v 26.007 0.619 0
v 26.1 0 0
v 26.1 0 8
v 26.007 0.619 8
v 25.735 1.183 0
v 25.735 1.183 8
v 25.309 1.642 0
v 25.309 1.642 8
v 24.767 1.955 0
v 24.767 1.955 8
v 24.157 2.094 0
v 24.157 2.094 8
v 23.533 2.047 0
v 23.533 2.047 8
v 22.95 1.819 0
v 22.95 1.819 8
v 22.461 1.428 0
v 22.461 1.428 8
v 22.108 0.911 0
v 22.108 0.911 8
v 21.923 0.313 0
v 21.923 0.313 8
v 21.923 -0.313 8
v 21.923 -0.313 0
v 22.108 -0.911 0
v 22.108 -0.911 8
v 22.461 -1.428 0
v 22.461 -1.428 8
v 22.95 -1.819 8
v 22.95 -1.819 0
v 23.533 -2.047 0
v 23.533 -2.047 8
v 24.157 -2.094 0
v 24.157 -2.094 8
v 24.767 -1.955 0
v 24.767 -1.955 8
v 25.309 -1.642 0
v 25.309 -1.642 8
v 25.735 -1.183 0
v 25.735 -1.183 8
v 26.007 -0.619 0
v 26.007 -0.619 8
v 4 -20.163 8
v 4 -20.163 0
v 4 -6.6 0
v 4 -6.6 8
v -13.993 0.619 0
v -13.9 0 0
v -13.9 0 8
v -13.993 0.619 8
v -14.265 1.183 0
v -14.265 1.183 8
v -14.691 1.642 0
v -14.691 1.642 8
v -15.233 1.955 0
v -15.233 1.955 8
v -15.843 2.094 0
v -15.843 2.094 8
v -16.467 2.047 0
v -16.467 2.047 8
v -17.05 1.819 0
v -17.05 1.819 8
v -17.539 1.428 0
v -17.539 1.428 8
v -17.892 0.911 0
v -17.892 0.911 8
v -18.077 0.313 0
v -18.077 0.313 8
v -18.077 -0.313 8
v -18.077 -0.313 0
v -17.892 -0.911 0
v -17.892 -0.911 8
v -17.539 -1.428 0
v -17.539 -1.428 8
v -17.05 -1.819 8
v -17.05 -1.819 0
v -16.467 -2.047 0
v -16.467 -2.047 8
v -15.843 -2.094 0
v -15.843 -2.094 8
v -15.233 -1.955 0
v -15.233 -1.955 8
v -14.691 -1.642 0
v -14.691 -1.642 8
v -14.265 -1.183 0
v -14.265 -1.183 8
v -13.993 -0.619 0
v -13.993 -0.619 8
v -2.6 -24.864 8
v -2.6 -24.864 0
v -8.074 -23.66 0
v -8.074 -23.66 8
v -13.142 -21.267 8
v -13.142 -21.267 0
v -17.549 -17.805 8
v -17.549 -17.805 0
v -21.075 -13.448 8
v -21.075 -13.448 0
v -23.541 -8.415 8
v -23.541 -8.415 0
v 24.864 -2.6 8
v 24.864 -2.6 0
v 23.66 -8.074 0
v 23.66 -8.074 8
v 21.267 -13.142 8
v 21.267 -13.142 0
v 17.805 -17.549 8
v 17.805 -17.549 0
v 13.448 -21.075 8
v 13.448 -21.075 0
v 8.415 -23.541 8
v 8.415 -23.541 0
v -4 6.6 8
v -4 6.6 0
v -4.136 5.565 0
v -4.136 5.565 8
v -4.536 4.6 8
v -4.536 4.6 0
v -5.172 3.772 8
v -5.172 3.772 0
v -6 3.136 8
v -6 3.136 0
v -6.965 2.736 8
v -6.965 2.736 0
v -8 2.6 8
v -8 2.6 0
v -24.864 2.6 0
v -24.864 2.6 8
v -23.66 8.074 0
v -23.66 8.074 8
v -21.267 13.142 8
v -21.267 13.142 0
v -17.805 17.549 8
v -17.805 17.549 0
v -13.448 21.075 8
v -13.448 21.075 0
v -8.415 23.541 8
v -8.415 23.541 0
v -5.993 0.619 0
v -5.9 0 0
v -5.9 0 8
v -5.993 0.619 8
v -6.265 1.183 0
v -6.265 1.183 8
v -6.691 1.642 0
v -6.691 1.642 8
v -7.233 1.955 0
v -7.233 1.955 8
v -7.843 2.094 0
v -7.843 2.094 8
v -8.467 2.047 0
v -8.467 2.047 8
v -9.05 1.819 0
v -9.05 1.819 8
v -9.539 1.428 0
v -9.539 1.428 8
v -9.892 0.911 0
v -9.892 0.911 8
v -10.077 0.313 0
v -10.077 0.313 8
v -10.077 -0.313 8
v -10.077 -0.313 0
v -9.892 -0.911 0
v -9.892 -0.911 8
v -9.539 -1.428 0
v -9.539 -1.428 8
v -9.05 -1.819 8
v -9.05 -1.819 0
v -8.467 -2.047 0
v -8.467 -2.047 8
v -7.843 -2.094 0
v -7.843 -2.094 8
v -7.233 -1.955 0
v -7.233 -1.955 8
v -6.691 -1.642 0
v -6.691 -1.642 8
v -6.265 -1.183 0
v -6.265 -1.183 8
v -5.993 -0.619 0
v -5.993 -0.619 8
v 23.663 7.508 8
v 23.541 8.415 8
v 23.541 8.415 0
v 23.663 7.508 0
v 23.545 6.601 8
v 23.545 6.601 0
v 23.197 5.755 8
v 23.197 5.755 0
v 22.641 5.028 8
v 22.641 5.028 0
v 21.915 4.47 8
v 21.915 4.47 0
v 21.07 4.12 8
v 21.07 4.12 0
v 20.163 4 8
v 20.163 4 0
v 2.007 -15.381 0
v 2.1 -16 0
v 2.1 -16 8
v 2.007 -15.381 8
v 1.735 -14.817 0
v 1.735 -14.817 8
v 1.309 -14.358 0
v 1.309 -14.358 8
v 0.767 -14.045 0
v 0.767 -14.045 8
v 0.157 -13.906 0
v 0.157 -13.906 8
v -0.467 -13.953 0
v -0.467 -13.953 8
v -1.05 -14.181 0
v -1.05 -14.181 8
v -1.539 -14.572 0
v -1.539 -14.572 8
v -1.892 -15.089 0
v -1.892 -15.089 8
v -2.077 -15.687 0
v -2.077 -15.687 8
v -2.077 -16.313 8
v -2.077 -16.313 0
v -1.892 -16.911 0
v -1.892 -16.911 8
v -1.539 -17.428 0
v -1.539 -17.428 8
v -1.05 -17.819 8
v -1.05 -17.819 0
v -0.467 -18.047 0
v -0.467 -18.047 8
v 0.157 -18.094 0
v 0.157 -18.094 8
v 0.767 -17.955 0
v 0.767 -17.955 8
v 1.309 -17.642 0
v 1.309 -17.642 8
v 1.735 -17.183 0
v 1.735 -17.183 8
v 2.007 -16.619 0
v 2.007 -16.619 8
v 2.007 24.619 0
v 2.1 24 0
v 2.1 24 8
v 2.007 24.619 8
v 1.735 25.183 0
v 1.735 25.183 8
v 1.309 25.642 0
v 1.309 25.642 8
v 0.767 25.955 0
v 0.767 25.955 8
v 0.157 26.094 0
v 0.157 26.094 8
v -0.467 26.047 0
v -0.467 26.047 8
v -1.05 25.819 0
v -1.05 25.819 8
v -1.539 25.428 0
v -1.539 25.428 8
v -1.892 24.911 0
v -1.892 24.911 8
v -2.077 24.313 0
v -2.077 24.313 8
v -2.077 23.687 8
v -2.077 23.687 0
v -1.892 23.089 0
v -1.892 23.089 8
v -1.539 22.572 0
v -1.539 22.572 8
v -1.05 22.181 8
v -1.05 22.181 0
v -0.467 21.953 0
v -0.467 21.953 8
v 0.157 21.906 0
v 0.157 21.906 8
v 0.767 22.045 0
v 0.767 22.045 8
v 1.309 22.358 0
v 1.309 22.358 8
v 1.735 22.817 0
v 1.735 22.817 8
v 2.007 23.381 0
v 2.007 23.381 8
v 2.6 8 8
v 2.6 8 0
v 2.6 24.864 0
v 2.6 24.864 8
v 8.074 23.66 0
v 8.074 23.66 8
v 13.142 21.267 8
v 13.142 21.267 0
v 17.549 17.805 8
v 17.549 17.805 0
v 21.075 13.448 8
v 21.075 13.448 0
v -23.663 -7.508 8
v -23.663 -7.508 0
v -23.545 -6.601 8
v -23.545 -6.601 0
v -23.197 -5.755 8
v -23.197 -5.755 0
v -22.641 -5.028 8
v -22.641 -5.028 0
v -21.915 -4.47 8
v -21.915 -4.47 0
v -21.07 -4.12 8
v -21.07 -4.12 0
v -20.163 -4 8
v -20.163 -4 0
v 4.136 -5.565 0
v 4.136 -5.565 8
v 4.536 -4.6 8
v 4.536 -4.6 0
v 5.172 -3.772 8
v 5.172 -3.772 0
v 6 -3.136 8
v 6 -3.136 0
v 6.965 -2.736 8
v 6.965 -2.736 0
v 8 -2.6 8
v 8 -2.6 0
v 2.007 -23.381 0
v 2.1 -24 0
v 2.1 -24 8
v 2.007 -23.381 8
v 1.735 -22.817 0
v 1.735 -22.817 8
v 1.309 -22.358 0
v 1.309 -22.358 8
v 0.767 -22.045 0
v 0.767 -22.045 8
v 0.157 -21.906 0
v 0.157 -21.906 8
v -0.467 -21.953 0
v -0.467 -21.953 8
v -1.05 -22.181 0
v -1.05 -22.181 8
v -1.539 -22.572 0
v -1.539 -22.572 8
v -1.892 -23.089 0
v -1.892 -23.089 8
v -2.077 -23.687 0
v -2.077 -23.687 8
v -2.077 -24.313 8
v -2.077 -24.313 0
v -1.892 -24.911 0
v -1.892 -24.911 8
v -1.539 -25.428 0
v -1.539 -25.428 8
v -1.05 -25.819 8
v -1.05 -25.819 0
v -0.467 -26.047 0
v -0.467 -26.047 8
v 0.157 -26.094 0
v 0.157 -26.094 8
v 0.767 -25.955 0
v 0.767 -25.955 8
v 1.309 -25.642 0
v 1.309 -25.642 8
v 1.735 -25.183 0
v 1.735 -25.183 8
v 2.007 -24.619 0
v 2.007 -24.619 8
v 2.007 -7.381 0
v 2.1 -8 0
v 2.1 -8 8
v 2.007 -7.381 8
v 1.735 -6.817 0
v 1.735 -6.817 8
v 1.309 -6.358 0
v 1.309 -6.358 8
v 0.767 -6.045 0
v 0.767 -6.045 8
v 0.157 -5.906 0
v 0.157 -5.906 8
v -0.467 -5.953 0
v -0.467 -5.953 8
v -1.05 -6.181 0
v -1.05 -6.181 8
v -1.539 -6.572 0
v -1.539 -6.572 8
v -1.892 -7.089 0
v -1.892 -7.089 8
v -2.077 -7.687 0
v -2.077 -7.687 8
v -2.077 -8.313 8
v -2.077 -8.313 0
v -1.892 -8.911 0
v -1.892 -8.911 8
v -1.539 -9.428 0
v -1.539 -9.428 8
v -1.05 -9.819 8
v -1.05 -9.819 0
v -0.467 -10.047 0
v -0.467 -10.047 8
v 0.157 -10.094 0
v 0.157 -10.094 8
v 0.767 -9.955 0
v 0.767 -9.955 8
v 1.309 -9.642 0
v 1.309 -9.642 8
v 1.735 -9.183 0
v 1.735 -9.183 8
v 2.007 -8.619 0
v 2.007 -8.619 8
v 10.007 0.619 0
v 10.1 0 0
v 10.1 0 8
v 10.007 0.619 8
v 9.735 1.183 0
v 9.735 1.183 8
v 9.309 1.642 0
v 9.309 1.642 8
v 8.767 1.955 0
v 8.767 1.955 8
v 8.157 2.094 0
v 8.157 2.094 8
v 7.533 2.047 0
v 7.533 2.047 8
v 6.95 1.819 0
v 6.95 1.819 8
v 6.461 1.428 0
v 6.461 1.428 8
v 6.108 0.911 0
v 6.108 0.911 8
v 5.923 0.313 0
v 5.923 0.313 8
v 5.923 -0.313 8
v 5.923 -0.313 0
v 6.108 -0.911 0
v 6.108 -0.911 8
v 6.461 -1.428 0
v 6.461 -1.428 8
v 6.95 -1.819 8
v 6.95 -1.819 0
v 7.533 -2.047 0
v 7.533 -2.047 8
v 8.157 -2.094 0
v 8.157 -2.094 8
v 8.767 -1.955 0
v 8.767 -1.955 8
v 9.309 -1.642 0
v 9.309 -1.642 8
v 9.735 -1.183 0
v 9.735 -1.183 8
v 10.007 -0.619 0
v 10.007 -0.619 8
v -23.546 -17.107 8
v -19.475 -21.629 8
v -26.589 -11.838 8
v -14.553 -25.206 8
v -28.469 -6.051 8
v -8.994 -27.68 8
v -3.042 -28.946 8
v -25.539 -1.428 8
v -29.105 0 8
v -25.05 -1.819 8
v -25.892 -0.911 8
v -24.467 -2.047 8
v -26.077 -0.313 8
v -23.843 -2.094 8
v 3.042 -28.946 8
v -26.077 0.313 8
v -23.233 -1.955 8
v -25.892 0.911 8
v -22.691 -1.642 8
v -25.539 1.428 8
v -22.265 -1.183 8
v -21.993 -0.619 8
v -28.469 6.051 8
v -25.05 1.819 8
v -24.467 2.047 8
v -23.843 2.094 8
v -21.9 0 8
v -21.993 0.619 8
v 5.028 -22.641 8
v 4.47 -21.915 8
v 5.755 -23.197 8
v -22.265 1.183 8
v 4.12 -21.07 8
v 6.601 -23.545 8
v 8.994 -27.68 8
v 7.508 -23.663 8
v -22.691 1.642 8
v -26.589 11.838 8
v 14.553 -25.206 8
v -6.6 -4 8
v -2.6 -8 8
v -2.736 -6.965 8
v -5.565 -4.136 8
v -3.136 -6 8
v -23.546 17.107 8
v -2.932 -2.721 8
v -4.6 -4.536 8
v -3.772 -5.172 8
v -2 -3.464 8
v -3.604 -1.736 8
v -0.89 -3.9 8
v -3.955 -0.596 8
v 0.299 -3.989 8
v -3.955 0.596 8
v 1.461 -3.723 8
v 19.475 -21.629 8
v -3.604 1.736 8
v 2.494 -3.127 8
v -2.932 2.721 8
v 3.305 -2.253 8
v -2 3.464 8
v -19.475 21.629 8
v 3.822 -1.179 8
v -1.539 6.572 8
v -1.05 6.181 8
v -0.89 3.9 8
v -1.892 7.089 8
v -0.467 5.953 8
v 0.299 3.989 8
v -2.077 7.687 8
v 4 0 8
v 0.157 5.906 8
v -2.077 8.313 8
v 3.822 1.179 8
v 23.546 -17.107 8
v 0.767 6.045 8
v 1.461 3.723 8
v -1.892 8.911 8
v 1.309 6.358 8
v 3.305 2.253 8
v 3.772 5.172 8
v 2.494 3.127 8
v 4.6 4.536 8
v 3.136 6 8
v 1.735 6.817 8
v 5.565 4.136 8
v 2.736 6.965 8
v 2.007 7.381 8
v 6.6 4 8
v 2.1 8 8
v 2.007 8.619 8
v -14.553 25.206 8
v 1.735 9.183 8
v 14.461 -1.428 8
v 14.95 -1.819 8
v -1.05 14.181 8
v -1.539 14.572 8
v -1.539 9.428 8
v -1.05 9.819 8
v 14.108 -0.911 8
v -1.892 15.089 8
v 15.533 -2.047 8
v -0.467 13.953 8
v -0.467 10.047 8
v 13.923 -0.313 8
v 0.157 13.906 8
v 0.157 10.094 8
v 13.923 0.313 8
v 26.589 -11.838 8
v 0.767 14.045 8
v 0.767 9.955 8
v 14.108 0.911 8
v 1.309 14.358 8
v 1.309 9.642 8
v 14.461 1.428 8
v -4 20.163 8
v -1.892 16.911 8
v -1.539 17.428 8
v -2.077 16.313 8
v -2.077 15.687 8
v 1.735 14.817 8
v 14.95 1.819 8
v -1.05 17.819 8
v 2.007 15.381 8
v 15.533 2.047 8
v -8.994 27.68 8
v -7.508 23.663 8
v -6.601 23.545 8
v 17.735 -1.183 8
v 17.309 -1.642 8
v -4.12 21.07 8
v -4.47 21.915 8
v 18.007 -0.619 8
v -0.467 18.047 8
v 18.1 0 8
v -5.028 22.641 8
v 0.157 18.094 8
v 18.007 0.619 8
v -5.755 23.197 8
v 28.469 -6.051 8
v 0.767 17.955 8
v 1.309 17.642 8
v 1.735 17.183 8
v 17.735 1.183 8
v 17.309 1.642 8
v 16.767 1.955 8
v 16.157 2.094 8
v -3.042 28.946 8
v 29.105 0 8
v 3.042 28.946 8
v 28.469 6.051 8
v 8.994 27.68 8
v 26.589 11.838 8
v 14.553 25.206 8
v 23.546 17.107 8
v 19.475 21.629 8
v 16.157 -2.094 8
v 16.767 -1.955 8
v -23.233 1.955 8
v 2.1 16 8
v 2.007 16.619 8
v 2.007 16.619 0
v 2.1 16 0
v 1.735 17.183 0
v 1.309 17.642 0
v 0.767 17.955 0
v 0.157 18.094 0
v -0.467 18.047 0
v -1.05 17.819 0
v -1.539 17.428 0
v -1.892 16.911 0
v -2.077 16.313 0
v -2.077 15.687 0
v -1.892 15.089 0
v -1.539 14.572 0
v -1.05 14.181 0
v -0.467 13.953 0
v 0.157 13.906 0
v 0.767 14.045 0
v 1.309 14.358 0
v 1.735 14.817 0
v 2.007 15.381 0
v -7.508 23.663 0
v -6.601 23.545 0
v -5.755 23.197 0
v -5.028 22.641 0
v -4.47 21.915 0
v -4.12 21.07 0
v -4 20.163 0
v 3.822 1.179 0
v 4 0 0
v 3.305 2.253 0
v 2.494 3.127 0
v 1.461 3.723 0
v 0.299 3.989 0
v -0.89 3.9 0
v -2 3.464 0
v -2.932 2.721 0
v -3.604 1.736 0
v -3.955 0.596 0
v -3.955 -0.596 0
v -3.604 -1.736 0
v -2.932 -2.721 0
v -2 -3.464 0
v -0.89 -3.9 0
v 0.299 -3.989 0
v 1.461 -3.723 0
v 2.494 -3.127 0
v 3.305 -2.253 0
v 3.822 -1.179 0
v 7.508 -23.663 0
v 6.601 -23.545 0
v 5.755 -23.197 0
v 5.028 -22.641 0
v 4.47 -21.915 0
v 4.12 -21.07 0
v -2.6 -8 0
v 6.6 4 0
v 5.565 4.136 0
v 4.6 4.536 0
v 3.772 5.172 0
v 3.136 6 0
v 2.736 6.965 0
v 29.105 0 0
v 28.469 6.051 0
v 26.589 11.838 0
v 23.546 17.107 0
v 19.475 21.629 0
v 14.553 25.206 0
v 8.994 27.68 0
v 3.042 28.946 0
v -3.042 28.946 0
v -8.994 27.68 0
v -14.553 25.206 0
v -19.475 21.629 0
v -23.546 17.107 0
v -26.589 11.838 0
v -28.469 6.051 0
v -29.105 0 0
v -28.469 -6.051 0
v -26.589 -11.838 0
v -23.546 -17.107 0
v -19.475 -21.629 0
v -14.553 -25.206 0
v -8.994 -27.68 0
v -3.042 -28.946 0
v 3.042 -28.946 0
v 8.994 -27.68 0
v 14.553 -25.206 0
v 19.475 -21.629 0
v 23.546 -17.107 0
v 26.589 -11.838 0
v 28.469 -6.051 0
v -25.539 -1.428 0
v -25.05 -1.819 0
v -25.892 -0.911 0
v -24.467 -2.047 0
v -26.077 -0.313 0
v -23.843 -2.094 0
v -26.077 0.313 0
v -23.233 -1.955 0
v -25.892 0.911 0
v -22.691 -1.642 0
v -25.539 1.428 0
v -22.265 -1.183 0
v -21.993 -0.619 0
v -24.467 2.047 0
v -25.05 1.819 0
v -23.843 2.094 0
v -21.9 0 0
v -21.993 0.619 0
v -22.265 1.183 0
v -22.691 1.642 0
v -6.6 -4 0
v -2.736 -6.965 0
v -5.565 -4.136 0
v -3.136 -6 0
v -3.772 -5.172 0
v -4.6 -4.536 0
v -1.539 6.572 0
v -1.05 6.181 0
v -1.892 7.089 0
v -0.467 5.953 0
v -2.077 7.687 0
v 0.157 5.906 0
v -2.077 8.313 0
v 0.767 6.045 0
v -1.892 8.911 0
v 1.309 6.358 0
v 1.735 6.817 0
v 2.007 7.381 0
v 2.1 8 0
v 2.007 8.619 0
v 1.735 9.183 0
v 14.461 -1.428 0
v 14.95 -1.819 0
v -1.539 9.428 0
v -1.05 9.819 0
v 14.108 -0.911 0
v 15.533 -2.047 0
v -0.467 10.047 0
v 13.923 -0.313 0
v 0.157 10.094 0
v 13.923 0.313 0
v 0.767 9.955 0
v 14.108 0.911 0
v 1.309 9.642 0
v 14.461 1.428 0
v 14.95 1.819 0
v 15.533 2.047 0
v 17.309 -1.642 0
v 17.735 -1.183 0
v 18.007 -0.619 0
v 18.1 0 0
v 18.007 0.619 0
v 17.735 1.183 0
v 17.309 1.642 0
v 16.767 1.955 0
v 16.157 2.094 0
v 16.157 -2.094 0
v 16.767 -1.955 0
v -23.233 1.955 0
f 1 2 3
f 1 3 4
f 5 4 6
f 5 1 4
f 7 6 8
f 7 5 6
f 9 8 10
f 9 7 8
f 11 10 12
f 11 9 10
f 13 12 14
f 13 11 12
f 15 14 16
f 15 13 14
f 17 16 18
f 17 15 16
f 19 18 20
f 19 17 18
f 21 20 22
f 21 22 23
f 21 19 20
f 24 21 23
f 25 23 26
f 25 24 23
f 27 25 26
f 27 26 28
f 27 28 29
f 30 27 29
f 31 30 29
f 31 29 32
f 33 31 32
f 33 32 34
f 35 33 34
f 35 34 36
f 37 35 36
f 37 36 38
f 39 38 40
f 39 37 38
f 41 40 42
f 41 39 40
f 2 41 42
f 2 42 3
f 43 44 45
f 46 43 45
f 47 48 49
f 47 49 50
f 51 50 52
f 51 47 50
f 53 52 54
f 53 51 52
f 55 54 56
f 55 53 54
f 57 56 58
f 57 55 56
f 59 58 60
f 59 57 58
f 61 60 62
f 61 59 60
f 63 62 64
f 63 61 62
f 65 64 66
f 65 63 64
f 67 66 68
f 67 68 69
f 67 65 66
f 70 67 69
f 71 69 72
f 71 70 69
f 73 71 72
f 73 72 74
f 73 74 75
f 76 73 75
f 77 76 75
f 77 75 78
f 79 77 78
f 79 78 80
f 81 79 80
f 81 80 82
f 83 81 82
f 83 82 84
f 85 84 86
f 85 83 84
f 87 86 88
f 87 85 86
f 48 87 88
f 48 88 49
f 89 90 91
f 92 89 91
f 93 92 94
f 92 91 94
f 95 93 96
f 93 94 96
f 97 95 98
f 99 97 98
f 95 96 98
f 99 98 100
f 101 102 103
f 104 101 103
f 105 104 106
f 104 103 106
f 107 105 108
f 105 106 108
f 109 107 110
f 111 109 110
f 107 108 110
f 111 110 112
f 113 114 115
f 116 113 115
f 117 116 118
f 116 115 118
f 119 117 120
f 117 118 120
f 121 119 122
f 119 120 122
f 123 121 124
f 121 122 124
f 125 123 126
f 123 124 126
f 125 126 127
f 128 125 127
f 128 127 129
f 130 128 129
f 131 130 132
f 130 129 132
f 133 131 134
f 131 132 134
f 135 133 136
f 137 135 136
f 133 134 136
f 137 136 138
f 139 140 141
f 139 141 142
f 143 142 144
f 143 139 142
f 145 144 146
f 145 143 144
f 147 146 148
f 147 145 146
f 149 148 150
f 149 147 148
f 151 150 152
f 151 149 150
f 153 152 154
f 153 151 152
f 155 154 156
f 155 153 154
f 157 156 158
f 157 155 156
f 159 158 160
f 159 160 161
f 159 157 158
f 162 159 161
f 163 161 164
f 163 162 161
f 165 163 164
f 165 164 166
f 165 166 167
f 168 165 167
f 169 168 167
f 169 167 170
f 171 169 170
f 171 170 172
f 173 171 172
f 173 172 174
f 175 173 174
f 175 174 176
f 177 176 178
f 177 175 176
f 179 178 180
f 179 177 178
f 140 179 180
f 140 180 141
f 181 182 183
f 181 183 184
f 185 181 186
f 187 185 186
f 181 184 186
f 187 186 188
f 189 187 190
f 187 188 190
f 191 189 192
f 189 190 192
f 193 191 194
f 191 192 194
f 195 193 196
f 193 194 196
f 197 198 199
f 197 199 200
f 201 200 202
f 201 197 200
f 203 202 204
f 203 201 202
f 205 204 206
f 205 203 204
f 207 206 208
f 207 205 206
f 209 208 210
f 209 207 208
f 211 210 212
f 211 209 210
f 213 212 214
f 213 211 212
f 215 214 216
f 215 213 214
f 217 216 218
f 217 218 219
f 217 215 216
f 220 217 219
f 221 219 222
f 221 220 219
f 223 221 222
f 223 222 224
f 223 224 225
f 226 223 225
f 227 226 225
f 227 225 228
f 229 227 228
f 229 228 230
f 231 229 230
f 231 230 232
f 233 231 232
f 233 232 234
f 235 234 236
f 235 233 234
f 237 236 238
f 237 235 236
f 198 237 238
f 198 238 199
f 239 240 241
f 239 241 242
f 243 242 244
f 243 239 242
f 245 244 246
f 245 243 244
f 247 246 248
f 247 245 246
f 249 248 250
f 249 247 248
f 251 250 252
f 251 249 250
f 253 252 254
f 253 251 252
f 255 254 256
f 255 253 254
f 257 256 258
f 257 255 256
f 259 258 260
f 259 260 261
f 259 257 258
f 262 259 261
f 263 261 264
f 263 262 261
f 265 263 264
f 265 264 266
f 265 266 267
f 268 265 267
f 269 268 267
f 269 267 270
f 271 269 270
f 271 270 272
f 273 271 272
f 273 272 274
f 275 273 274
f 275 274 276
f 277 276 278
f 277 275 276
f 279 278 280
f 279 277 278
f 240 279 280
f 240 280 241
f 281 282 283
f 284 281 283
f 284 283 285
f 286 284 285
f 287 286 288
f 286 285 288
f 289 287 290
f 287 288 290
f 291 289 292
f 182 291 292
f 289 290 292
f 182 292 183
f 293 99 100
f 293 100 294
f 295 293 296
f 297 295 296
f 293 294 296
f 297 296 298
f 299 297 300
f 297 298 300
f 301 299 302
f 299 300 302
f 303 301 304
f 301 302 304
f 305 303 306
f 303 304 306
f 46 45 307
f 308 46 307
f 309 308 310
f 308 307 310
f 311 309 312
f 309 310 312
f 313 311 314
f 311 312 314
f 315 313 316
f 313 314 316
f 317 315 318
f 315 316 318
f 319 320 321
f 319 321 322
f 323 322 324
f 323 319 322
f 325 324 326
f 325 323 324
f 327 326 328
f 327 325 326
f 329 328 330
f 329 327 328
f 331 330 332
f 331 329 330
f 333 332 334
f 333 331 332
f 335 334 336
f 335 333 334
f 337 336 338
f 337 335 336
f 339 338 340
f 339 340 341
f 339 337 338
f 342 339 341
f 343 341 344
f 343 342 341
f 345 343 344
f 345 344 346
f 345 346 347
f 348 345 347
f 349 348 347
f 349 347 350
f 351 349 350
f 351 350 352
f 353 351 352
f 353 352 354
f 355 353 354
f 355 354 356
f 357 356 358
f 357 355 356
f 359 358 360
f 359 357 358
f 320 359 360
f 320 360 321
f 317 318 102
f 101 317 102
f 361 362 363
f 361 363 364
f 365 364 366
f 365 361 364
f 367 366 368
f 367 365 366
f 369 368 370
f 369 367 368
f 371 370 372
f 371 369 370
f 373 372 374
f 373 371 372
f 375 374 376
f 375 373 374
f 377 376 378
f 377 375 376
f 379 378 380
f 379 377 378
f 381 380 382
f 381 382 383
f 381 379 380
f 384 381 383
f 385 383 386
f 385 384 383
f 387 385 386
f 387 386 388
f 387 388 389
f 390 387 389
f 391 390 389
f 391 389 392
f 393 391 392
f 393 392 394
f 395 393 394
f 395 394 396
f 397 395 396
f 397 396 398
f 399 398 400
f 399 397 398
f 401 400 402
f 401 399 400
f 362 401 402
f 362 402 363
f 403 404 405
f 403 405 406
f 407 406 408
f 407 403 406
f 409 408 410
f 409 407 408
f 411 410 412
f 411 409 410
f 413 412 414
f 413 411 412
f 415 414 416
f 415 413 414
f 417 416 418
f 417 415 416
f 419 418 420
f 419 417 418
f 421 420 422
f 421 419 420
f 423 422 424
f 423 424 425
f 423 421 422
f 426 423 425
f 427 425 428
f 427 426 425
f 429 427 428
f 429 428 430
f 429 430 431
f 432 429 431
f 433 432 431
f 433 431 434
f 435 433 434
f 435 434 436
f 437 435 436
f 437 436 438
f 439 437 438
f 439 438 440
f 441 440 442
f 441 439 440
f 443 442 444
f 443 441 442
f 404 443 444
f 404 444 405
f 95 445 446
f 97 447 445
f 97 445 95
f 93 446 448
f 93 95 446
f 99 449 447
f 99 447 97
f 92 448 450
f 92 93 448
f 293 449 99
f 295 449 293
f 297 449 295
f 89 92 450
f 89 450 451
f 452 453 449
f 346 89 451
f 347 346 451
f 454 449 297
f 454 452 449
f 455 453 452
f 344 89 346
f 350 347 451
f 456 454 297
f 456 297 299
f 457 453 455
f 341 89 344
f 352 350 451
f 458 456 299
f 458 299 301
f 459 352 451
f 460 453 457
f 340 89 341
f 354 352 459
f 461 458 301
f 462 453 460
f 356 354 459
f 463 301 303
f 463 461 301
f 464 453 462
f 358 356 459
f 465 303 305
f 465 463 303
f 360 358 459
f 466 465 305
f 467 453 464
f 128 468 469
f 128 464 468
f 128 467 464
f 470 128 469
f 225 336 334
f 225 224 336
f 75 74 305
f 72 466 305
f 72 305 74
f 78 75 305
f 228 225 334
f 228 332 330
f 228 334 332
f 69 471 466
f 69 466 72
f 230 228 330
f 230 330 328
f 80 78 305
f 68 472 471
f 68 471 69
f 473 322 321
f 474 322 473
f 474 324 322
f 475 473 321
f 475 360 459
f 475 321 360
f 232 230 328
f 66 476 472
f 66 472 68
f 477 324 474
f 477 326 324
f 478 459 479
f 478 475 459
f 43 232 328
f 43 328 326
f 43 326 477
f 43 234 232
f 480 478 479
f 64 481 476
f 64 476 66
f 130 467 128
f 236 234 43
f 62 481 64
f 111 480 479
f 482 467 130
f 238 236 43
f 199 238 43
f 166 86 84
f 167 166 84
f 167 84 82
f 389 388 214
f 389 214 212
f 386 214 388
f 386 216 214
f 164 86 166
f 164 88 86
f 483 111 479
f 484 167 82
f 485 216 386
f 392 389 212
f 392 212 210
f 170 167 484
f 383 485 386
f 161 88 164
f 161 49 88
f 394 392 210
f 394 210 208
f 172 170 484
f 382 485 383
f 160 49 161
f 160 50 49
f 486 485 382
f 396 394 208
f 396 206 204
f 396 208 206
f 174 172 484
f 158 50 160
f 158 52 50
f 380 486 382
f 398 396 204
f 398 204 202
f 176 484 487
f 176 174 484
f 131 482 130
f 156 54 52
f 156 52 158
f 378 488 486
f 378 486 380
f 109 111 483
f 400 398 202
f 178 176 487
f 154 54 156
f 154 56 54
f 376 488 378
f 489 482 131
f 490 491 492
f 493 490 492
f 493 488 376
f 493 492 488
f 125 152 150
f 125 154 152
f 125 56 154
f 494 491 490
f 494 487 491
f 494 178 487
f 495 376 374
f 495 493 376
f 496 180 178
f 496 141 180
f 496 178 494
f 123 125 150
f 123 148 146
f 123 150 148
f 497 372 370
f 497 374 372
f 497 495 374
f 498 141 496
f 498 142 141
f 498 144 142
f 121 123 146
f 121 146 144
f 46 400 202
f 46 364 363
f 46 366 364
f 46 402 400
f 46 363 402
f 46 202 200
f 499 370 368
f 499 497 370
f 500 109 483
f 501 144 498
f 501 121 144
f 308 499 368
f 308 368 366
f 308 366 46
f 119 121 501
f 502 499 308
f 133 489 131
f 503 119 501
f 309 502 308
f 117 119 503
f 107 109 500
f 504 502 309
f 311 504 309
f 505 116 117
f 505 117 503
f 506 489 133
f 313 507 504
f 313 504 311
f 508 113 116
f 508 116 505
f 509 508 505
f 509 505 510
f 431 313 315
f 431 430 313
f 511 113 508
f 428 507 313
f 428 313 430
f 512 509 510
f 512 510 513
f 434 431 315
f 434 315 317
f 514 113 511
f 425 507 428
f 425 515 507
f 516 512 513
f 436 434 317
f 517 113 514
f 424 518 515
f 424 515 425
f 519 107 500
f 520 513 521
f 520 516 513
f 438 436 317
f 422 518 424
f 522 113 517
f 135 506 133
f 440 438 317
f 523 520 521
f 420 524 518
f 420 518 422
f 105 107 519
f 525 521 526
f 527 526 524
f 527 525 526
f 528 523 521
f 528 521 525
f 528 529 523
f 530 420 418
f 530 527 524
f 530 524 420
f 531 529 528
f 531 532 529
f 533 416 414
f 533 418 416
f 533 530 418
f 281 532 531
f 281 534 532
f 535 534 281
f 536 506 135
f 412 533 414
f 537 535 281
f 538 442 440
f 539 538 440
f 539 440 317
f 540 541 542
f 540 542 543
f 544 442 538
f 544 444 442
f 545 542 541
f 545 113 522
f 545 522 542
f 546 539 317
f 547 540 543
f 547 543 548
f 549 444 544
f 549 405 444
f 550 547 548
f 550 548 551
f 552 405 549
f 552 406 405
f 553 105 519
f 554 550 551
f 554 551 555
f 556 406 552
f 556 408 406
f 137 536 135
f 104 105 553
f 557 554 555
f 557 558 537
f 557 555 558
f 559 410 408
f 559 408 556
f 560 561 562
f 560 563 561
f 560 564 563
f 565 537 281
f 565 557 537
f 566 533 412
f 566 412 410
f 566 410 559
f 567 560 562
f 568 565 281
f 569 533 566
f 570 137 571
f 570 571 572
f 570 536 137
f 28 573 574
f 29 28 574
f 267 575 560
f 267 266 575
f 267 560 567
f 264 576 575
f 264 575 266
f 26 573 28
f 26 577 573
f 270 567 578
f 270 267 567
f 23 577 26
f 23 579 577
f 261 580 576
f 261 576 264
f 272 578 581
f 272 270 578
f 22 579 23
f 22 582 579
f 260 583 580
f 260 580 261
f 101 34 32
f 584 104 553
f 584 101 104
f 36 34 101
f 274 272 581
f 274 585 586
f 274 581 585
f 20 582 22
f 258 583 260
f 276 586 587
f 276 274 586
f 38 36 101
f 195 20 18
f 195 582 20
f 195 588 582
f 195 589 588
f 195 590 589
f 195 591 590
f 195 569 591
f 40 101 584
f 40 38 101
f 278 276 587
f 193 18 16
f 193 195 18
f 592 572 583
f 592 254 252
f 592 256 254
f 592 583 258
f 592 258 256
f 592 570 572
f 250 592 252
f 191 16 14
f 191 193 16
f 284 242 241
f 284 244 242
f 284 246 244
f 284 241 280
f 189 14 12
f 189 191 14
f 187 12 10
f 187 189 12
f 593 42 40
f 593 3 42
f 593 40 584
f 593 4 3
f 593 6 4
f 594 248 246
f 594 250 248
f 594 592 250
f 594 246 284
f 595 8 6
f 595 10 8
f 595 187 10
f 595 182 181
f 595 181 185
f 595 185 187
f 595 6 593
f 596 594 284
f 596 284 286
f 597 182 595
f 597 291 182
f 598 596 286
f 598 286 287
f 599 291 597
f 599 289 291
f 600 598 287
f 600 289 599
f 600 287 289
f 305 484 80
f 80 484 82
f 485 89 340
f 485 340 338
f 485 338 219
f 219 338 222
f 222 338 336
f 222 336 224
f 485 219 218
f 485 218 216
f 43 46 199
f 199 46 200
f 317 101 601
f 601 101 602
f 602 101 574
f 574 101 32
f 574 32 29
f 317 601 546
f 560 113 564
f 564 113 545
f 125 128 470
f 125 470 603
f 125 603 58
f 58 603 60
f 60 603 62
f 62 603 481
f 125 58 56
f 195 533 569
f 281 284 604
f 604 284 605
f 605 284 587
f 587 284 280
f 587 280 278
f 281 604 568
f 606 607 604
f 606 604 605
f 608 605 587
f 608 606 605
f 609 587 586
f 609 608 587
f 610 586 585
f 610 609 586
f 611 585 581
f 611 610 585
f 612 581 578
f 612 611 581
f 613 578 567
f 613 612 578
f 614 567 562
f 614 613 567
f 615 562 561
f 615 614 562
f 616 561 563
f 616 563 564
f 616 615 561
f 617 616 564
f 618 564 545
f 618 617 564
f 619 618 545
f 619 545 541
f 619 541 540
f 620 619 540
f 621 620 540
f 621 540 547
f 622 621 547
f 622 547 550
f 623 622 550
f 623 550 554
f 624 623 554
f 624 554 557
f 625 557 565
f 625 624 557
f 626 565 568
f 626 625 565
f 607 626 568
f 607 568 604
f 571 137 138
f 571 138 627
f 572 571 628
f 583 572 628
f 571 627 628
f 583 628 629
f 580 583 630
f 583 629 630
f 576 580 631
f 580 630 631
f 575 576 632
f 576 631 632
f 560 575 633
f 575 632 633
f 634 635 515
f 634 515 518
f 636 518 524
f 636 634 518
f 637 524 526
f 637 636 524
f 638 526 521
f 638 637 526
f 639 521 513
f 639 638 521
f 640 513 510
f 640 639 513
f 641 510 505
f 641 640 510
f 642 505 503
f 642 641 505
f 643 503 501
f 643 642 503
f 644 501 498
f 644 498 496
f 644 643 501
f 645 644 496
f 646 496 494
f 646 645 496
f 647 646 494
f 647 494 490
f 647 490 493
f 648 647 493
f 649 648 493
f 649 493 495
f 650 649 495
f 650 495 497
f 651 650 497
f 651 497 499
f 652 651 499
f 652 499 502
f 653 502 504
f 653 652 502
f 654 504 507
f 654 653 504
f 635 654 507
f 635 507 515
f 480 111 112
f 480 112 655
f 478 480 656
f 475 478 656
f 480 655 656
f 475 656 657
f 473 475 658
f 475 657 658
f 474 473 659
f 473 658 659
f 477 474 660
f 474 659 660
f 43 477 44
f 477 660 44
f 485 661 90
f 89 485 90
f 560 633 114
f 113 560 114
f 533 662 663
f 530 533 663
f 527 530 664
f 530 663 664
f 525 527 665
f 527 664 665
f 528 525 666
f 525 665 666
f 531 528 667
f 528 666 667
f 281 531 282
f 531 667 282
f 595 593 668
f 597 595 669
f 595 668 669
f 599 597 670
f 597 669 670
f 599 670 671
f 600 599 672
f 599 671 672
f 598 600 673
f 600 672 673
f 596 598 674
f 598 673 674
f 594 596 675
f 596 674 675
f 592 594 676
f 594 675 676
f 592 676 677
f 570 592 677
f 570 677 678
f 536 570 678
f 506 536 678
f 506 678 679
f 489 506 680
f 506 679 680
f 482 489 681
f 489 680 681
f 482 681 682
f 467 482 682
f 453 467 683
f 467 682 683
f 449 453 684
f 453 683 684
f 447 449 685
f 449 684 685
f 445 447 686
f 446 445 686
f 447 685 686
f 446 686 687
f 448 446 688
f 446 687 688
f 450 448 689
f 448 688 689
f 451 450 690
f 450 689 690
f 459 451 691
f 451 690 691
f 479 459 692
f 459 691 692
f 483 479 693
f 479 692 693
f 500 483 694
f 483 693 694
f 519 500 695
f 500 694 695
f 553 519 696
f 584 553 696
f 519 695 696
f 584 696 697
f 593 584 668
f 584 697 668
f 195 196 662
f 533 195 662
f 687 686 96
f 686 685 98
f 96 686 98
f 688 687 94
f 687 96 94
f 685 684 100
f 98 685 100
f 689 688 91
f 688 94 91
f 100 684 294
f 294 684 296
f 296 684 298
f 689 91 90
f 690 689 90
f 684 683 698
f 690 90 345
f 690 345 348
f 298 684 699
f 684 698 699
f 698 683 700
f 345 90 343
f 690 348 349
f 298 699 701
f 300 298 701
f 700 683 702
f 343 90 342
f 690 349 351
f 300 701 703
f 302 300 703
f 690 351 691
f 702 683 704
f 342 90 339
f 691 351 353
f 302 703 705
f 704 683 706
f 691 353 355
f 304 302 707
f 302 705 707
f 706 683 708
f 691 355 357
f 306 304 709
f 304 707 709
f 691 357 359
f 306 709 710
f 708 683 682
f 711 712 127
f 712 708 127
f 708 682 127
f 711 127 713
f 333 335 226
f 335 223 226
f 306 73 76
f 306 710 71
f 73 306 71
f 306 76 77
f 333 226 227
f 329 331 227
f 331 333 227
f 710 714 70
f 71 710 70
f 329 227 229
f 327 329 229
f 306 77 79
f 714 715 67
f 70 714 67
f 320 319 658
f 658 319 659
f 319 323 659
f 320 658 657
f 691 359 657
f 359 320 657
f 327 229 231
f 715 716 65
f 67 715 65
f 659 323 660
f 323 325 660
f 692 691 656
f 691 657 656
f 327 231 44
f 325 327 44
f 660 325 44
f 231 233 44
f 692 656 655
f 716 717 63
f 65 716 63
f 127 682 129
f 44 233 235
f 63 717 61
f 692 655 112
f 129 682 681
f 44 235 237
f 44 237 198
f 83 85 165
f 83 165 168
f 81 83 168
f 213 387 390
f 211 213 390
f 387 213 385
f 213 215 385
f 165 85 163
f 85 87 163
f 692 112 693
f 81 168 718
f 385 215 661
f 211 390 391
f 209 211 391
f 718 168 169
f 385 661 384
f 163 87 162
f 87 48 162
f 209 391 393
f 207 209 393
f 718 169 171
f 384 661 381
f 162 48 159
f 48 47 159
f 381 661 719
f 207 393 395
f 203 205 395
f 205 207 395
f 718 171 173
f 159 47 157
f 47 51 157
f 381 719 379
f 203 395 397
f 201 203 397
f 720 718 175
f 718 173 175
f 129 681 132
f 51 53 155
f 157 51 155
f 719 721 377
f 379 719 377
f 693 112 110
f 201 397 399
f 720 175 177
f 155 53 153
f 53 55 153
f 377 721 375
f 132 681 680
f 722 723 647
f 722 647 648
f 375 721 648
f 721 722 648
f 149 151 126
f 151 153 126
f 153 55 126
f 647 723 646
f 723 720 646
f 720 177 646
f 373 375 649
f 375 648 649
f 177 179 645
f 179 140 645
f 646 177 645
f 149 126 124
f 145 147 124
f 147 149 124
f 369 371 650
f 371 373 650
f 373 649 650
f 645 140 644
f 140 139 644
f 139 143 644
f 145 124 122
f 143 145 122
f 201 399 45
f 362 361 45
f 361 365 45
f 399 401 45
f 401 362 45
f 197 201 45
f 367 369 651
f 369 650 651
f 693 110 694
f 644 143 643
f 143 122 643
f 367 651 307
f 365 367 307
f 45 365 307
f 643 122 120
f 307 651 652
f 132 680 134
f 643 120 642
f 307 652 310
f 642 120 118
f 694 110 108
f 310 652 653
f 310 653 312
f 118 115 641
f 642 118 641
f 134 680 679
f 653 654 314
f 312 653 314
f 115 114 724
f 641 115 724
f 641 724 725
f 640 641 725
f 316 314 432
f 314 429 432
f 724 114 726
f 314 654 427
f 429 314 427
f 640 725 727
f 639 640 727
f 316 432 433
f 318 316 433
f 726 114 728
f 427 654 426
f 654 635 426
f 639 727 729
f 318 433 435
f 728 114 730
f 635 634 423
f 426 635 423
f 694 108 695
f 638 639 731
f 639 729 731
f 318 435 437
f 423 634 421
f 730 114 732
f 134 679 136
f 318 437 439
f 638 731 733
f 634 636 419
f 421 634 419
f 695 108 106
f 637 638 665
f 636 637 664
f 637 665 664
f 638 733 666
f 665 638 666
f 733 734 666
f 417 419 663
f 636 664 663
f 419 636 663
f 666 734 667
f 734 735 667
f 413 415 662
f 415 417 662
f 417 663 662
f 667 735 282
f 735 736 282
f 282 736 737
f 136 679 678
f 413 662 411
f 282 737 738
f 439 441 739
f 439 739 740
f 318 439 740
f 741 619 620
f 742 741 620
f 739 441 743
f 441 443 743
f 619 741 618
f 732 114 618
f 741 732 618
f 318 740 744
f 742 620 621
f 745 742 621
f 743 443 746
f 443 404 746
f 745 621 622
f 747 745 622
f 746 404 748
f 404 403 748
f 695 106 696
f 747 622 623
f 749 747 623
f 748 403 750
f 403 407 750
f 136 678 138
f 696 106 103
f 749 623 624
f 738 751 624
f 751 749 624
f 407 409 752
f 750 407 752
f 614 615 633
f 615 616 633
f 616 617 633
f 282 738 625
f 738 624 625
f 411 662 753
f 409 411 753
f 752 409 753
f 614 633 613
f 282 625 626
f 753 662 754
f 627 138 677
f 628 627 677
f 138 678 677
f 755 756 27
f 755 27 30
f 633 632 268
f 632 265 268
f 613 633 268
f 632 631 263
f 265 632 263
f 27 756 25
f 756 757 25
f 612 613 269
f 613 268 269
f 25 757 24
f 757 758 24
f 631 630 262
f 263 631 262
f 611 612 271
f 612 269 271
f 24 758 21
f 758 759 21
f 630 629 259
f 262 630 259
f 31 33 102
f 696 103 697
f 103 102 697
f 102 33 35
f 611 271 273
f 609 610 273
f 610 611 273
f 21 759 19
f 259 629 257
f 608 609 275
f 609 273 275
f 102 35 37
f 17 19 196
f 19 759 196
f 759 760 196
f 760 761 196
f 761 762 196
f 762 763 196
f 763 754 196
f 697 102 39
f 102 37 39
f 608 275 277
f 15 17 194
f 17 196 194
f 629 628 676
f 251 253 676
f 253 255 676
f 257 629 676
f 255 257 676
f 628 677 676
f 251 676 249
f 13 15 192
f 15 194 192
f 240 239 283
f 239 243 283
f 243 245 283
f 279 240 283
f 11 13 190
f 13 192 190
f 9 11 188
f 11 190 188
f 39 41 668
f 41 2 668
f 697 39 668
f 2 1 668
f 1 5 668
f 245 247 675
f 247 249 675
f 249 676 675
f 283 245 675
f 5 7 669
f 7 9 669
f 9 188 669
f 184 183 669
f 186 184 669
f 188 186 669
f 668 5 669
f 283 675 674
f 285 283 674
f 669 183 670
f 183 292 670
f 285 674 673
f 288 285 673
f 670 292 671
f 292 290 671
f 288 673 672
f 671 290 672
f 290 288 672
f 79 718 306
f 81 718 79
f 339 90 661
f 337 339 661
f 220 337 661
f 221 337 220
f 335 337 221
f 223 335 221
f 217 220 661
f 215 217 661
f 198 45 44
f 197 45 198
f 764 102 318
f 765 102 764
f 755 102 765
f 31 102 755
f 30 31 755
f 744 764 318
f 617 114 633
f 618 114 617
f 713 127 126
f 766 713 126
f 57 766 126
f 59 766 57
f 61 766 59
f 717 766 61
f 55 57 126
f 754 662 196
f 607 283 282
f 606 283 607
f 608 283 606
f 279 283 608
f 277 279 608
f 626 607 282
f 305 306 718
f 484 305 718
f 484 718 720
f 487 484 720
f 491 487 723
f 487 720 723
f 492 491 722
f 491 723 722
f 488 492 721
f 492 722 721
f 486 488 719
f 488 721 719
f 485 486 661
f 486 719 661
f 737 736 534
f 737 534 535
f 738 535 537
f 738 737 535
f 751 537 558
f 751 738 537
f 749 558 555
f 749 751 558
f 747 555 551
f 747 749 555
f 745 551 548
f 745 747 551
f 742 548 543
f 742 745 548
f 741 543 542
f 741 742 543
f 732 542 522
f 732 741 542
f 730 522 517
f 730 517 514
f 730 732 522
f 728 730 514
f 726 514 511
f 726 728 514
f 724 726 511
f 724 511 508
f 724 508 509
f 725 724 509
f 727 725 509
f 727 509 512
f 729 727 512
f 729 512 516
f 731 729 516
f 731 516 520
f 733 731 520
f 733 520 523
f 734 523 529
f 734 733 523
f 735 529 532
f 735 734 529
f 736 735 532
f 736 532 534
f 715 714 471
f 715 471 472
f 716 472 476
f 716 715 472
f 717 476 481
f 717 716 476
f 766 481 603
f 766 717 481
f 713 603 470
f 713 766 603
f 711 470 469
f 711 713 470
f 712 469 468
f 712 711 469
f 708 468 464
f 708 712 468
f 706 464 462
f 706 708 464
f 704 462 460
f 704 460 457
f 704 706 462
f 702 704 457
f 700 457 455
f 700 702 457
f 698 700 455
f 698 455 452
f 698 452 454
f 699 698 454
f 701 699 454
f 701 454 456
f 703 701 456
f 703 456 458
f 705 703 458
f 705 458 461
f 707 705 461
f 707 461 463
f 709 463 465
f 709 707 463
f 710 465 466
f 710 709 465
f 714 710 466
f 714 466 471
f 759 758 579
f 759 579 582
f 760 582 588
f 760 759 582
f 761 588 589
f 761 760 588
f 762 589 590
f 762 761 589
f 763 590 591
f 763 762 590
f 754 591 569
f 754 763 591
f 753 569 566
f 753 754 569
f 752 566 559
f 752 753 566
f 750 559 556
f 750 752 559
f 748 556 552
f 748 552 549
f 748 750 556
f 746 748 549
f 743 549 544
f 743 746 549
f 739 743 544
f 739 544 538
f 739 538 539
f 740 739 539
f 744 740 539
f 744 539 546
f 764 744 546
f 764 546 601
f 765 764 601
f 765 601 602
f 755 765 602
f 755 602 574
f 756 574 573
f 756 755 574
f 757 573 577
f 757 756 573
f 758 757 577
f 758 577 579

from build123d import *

# Parameters (mm, degrees)
CROQUIS1_R              = 29.105
CROQUIS1_R_2            = 4
CROQUIS1_R_3            = 2.1
SALIENTE_EXTRUIR1_DEPTH = 8


with BuildPart() as part:
    # Croquis1 → Saliente-Extruir1 (new body)
    with BuildSketch(Plane.XY):
        Circle(CROQUIS1_R)
        Circle(CROQUIS1_R_2, mode=Mode.SUBTRACT)
        with BuildLine():
            ThreePointArc((6.6, 4), (3.771572875, 5.171572875), (2.6, 8))
            Line((2.6, 8), (2.6, 24.864432429))
            ThreePointArc((2.6, 24.864432429), (15.442895729, 19.66003488), (23.541098272, 8.415265423))
            ThreePointArc((23.541098272, 8.415265423), (22.942587119, 5.373198291), (20.162890285, 4))
            Line((20.162890285, 4), (6.6, 4))
        make_face(mode=Mode.SUBTRACT)
        with Locations((0, 24)):
            Circle(CROQUIS1_R_3, mode=Mode.SUBTRACT)
        with BuildLine():
            ThreePointArc((-8.415265423, 23.541098272), (-5.373198291, 22.942587119), (-4, 20.162890285))
            Line((-4, 20.162890285), (-4, 6.6))
            ThreePointArc((-4, 6.6), (-5.171572875, 3.771572875), (-8, 2.6))
            Line((-8, 2.6), (-24.864432429, 2.6))
            ThreePointArc((-24.864432429, 2.6), (-19.66003488, 15.442895729), (-8.415265423, 23.541098272))
        make_face(mode=Mode.SUBTRACT)
        with Locations((-24, 0)):
            Circle(CROQUIS1_R_3, mode=Mode.SUBTRACT)
        with BuildLine():
            ThreePointArc((-23.541098272, -8.415265423), (-22.942587119, -5.373198291), (-20.162890285, -4))
            Line((-20.162890285, -4), (-6.6, -4))
            ThreePointArc((-6.6, -4), (-3.771572875, -5.171572875), (-2.6, -8))
            Line((-2.6, -8), (-2.6, -24.864432429))
            ThreePointArc((-2.6, -24.864432429), (-15.442895729, -19.66003488), (-23.541098272, -8.415265423))
        make_face(mode=Mode.SUBTRACT)
        with Locations((0, -24)):
            Circle(CROQUIS1_R_3, mode=Mode.SUBTRACT)
        with BuildLine():
            ThreePointArc((8.415265423, -23.541098272), (5.373198291, -22.942587119), (4, -20.162890285))
            Line((4, -20.162890285), (4, -6.6))
            ThreePointArc((4, -6.6), (5.171572875, -3.771572875), (8, -2.6))
            Line((8, -2.6), (24.864432429, -2.6))
            ThreePointArc((24.864432429, -2.6), (19.66003488, -15.442895729), (8.415265423, -23.541098272))
        make_face(mode=Mode.SUBTRACT)
        with Locations((24, 0)):
            Circle(CROQUIS1_R_3, mode=Mode.SUBTRACT)
        with Locations((0, -8)):
            Circle(CROQUIS1_R_3, mode=Mode.SUBTRACT)
        with Locations((0, -16)):
            Circle(CROQUIS1_R_3, mode=Mode.SUBTRACT)
        with Locations((-8, 0)):
            Circle(CROQUIS1_R_3, mode=Mode.SUBTRACT)
        with Locations((-16, 0)):
            Circle(CROQUIS1_R_3, mode=Mode.SUBTRACT)
        with Locations((0, 8)):
            Circle(CROQUIS1_R_3, mode=Mode.SUBTRACT)
        with Locations((0, 16)):
            Circle(CROQUIS1_R_3, mode=Mode.SUBTRACT)
        with Locations((16, 0)):
            Circle(CROQUIS1_R_3, mode=Mode.SUBTRACT)
        with Locations((8, 0)):
            Circle(CROQUIS1_R_3, mode=Mode.SUBTRACT)
    extrude(amount=SALIENTE_EXTRUIR1_DEPTH)


solid = part.part
